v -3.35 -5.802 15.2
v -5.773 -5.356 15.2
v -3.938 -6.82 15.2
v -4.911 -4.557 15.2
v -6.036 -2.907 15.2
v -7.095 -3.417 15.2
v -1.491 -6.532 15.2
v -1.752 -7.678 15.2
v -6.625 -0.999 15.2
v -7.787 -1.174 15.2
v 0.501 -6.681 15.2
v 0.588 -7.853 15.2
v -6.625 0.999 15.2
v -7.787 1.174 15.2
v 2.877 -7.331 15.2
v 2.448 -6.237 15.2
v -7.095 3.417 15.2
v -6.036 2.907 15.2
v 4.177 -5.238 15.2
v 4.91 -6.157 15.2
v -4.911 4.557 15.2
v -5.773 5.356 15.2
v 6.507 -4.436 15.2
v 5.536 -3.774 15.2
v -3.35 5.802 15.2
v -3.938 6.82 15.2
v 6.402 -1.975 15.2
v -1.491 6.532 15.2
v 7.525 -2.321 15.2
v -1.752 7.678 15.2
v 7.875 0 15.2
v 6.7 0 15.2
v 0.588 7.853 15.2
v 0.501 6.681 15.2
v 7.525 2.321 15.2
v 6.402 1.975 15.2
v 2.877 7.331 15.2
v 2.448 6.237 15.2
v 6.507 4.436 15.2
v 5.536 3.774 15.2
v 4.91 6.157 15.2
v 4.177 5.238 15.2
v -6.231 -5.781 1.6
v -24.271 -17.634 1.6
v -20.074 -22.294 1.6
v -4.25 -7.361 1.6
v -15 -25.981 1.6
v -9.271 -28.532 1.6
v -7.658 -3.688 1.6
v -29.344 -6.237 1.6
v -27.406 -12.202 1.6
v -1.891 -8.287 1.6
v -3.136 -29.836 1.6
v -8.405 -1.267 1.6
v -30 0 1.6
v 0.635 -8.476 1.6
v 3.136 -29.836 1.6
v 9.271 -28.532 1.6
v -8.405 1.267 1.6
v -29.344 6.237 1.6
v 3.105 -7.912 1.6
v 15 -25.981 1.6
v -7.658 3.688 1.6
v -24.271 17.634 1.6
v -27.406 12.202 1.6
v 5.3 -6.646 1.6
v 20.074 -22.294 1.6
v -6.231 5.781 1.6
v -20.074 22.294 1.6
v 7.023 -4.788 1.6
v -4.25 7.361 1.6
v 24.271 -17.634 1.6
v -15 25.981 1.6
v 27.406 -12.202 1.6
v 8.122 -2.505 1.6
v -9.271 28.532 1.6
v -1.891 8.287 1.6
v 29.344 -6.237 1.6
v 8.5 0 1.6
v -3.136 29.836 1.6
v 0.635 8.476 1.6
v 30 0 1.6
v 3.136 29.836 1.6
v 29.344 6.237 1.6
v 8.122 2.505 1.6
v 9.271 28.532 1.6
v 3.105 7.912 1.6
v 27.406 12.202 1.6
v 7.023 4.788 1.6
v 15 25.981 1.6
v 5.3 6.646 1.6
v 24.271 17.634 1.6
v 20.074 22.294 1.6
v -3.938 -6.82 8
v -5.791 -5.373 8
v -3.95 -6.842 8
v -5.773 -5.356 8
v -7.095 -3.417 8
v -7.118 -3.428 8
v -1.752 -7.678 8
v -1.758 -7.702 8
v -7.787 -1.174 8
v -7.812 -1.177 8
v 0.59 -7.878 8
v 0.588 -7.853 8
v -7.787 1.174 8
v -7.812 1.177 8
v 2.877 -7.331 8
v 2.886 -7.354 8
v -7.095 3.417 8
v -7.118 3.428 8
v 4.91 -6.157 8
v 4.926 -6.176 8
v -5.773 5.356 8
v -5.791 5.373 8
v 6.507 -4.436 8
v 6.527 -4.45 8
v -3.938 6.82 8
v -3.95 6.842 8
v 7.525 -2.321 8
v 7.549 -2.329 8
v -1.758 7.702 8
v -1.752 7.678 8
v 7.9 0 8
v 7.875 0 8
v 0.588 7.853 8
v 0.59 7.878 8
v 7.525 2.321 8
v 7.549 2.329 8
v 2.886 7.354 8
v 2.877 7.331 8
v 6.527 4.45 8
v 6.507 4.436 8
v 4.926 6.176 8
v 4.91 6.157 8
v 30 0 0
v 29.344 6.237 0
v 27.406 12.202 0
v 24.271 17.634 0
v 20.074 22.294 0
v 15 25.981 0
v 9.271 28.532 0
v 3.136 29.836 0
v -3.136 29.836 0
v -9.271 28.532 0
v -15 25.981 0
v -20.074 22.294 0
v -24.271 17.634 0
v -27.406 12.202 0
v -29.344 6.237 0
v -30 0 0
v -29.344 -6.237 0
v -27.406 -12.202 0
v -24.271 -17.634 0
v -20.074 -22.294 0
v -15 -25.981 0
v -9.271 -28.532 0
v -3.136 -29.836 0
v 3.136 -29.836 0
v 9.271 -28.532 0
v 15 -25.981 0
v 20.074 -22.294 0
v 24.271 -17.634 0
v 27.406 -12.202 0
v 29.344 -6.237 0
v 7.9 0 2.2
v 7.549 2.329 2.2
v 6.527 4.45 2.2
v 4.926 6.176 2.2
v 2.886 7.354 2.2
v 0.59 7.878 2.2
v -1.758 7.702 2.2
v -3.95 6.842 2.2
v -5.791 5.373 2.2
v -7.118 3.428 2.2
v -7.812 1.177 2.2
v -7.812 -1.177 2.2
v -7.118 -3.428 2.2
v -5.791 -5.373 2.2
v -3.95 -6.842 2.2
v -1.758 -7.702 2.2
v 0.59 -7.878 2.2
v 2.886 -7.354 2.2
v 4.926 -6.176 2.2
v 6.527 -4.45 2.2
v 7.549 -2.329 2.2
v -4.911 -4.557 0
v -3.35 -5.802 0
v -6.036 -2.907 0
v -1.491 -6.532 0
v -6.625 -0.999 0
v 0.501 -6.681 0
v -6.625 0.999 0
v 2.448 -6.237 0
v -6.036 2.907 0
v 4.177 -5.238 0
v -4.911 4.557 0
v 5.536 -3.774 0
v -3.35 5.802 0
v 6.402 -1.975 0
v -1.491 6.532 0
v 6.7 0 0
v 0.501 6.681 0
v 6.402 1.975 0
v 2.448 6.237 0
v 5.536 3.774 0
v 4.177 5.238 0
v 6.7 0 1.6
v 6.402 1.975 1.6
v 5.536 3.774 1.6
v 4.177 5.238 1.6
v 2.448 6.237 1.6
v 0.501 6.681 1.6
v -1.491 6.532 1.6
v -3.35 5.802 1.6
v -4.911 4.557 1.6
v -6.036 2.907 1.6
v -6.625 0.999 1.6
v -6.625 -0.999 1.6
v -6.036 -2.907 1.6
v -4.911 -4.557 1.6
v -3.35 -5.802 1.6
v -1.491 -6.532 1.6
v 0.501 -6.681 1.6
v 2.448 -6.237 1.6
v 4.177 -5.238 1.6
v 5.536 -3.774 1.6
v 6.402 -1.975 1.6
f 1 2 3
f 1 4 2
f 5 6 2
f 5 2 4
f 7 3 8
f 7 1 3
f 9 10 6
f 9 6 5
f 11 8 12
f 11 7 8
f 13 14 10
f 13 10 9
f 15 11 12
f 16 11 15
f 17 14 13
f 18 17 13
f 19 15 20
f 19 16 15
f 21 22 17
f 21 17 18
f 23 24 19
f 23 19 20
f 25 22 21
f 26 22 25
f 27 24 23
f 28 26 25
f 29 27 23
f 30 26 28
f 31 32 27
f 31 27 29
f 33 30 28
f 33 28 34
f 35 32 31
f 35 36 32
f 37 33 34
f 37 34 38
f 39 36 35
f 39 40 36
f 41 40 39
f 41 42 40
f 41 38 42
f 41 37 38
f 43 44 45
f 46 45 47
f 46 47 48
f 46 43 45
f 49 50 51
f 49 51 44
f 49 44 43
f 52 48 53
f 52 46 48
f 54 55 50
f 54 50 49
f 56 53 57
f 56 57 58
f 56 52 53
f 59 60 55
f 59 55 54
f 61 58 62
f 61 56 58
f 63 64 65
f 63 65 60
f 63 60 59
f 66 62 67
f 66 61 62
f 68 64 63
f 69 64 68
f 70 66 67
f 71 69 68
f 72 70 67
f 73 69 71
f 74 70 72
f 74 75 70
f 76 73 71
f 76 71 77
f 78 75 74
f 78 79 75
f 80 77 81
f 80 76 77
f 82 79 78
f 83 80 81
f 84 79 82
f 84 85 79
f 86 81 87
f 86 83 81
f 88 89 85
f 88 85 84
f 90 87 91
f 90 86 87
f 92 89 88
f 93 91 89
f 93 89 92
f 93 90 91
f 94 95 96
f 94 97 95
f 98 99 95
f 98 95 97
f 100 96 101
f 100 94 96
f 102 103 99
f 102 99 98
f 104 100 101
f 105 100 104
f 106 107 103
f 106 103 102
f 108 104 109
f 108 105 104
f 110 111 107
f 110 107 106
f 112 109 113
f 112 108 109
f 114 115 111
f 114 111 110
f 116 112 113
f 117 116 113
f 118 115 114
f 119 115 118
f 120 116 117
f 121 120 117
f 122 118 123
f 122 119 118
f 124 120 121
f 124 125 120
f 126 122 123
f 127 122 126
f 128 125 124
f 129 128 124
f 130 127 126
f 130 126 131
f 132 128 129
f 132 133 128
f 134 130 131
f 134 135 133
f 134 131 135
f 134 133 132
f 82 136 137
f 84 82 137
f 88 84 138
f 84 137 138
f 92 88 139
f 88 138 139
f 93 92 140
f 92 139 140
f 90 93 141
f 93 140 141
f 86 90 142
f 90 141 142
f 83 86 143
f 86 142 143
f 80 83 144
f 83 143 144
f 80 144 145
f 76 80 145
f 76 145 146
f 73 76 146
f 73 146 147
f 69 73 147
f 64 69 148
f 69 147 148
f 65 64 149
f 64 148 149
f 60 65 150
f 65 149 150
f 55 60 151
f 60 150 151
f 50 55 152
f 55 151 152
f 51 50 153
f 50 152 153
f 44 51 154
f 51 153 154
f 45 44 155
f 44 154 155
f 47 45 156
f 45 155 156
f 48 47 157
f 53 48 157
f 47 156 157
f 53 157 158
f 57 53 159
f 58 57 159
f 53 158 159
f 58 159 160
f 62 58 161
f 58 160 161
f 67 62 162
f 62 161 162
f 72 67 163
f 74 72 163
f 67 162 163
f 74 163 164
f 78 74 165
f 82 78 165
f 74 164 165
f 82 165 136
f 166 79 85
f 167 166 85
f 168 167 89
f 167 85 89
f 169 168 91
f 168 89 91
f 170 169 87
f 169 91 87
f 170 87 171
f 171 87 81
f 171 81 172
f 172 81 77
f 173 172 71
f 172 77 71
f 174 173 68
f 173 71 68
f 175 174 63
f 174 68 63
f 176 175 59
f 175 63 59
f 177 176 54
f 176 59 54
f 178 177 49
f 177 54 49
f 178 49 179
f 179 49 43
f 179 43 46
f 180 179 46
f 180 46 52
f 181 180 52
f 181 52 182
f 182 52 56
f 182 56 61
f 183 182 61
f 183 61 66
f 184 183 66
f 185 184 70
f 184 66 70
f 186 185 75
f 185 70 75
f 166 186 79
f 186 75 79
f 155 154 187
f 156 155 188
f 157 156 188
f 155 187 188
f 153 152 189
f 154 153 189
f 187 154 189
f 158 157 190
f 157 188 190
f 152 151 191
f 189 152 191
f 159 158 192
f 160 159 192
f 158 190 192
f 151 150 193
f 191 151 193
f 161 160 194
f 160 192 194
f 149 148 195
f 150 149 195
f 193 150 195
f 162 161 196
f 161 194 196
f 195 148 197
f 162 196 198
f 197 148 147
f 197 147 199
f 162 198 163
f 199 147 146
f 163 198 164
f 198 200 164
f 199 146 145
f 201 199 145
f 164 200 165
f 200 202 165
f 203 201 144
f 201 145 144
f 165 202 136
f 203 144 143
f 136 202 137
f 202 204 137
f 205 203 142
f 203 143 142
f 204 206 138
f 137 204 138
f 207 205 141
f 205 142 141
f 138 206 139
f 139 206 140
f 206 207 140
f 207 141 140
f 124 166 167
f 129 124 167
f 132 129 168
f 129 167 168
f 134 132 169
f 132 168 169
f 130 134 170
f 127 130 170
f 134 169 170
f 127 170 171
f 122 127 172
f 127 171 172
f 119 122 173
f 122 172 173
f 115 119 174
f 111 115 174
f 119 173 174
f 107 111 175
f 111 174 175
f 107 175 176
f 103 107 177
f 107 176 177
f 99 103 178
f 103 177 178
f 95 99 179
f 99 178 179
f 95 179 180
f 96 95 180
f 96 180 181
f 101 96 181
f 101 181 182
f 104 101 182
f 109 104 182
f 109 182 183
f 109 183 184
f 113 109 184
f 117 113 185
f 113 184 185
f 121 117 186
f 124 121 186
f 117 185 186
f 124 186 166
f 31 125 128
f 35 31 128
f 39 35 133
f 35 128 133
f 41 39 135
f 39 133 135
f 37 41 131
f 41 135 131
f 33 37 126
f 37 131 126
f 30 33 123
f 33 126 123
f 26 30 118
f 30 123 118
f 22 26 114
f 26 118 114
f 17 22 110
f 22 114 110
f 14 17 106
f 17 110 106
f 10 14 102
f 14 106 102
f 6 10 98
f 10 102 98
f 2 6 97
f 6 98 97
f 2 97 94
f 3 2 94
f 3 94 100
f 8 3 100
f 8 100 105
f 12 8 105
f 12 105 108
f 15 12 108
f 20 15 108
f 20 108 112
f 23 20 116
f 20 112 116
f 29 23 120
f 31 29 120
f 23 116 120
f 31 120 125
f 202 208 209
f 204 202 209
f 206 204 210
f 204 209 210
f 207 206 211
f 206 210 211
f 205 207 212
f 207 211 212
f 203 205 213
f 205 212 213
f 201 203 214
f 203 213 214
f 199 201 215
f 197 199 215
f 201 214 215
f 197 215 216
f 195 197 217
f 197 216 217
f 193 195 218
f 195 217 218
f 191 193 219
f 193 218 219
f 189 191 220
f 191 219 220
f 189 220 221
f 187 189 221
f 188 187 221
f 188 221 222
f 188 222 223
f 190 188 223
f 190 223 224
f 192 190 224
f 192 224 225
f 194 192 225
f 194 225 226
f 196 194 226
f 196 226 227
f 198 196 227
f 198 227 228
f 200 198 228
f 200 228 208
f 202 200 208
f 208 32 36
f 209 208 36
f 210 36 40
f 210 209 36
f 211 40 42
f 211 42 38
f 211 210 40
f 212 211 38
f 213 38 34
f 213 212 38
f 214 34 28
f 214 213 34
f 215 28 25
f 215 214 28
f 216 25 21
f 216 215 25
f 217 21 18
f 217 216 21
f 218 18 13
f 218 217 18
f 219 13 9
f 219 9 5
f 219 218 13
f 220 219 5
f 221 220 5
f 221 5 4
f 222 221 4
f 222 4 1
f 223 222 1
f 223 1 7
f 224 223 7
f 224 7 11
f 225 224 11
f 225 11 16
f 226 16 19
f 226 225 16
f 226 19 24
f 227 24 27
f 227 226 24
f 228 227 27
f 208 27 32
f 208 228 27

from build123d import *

# Parameters (mm, degrees)
SKETCH026_R     = 30
PAD018_DEPTH    = 1.6
SKETCH027_R     = 7.9
SKETCH027_R_2   = 6.7
PAD019_DEPTH    = 6.4
SKETCH028_R     = 7.875
SKETCH028_R_2   = 6.7
PAD020_DEPTH    = 7.2
SKETCH029_R     = 6.7000000001
POCKET006_DEPTH = 1.601
CHAMFER008_SIZE = 0.6


with BuildPart() as part:
    # Sketch026 → Pad018 (new body)
    with BuildSketch(Plane.XY):
        Circle(SKETCH026_R)
    extrude(amount=PAD018_DEPTH)

    # Sketch027 → Pad019 (join)
    with BuildSketch(Plane.XY.offset(1.6)):
        Circle(SKETCH027_R)
        Circle(SKETCH027_R_2, mode=Mode.SUBTRACT)
    extrude(amount=PAD019_DEPTH)

    # Sketch028 → Pad020 (join)
    with BuildSketch(Plane.XY.offset(8)):
        Circle(SKETCH028_R)
        Circle(SKETCH028_R_2, mode=Mode.SUBTRACT)
    extrude(amount=PAD020_DEPTH)

    # Sketch029 → Pocket006 (cut, through all)
    with BuildSketch(Plane.XY.offset(1.6)):
        Circle(SKETCH029_R)
    extrude(amount=-POCKET006_DEPTH, mode=Mode.SUBTRACT)

    # Chamfer008
    chamfer008_edges = [part.edges().sort_by_distance(p)[0] for p in [
        (-7.9, 0, 1.6),
    ]]
    chamfer(chamfer008_edges, length=CHAMFER008_SIZE)


solid = part.part
